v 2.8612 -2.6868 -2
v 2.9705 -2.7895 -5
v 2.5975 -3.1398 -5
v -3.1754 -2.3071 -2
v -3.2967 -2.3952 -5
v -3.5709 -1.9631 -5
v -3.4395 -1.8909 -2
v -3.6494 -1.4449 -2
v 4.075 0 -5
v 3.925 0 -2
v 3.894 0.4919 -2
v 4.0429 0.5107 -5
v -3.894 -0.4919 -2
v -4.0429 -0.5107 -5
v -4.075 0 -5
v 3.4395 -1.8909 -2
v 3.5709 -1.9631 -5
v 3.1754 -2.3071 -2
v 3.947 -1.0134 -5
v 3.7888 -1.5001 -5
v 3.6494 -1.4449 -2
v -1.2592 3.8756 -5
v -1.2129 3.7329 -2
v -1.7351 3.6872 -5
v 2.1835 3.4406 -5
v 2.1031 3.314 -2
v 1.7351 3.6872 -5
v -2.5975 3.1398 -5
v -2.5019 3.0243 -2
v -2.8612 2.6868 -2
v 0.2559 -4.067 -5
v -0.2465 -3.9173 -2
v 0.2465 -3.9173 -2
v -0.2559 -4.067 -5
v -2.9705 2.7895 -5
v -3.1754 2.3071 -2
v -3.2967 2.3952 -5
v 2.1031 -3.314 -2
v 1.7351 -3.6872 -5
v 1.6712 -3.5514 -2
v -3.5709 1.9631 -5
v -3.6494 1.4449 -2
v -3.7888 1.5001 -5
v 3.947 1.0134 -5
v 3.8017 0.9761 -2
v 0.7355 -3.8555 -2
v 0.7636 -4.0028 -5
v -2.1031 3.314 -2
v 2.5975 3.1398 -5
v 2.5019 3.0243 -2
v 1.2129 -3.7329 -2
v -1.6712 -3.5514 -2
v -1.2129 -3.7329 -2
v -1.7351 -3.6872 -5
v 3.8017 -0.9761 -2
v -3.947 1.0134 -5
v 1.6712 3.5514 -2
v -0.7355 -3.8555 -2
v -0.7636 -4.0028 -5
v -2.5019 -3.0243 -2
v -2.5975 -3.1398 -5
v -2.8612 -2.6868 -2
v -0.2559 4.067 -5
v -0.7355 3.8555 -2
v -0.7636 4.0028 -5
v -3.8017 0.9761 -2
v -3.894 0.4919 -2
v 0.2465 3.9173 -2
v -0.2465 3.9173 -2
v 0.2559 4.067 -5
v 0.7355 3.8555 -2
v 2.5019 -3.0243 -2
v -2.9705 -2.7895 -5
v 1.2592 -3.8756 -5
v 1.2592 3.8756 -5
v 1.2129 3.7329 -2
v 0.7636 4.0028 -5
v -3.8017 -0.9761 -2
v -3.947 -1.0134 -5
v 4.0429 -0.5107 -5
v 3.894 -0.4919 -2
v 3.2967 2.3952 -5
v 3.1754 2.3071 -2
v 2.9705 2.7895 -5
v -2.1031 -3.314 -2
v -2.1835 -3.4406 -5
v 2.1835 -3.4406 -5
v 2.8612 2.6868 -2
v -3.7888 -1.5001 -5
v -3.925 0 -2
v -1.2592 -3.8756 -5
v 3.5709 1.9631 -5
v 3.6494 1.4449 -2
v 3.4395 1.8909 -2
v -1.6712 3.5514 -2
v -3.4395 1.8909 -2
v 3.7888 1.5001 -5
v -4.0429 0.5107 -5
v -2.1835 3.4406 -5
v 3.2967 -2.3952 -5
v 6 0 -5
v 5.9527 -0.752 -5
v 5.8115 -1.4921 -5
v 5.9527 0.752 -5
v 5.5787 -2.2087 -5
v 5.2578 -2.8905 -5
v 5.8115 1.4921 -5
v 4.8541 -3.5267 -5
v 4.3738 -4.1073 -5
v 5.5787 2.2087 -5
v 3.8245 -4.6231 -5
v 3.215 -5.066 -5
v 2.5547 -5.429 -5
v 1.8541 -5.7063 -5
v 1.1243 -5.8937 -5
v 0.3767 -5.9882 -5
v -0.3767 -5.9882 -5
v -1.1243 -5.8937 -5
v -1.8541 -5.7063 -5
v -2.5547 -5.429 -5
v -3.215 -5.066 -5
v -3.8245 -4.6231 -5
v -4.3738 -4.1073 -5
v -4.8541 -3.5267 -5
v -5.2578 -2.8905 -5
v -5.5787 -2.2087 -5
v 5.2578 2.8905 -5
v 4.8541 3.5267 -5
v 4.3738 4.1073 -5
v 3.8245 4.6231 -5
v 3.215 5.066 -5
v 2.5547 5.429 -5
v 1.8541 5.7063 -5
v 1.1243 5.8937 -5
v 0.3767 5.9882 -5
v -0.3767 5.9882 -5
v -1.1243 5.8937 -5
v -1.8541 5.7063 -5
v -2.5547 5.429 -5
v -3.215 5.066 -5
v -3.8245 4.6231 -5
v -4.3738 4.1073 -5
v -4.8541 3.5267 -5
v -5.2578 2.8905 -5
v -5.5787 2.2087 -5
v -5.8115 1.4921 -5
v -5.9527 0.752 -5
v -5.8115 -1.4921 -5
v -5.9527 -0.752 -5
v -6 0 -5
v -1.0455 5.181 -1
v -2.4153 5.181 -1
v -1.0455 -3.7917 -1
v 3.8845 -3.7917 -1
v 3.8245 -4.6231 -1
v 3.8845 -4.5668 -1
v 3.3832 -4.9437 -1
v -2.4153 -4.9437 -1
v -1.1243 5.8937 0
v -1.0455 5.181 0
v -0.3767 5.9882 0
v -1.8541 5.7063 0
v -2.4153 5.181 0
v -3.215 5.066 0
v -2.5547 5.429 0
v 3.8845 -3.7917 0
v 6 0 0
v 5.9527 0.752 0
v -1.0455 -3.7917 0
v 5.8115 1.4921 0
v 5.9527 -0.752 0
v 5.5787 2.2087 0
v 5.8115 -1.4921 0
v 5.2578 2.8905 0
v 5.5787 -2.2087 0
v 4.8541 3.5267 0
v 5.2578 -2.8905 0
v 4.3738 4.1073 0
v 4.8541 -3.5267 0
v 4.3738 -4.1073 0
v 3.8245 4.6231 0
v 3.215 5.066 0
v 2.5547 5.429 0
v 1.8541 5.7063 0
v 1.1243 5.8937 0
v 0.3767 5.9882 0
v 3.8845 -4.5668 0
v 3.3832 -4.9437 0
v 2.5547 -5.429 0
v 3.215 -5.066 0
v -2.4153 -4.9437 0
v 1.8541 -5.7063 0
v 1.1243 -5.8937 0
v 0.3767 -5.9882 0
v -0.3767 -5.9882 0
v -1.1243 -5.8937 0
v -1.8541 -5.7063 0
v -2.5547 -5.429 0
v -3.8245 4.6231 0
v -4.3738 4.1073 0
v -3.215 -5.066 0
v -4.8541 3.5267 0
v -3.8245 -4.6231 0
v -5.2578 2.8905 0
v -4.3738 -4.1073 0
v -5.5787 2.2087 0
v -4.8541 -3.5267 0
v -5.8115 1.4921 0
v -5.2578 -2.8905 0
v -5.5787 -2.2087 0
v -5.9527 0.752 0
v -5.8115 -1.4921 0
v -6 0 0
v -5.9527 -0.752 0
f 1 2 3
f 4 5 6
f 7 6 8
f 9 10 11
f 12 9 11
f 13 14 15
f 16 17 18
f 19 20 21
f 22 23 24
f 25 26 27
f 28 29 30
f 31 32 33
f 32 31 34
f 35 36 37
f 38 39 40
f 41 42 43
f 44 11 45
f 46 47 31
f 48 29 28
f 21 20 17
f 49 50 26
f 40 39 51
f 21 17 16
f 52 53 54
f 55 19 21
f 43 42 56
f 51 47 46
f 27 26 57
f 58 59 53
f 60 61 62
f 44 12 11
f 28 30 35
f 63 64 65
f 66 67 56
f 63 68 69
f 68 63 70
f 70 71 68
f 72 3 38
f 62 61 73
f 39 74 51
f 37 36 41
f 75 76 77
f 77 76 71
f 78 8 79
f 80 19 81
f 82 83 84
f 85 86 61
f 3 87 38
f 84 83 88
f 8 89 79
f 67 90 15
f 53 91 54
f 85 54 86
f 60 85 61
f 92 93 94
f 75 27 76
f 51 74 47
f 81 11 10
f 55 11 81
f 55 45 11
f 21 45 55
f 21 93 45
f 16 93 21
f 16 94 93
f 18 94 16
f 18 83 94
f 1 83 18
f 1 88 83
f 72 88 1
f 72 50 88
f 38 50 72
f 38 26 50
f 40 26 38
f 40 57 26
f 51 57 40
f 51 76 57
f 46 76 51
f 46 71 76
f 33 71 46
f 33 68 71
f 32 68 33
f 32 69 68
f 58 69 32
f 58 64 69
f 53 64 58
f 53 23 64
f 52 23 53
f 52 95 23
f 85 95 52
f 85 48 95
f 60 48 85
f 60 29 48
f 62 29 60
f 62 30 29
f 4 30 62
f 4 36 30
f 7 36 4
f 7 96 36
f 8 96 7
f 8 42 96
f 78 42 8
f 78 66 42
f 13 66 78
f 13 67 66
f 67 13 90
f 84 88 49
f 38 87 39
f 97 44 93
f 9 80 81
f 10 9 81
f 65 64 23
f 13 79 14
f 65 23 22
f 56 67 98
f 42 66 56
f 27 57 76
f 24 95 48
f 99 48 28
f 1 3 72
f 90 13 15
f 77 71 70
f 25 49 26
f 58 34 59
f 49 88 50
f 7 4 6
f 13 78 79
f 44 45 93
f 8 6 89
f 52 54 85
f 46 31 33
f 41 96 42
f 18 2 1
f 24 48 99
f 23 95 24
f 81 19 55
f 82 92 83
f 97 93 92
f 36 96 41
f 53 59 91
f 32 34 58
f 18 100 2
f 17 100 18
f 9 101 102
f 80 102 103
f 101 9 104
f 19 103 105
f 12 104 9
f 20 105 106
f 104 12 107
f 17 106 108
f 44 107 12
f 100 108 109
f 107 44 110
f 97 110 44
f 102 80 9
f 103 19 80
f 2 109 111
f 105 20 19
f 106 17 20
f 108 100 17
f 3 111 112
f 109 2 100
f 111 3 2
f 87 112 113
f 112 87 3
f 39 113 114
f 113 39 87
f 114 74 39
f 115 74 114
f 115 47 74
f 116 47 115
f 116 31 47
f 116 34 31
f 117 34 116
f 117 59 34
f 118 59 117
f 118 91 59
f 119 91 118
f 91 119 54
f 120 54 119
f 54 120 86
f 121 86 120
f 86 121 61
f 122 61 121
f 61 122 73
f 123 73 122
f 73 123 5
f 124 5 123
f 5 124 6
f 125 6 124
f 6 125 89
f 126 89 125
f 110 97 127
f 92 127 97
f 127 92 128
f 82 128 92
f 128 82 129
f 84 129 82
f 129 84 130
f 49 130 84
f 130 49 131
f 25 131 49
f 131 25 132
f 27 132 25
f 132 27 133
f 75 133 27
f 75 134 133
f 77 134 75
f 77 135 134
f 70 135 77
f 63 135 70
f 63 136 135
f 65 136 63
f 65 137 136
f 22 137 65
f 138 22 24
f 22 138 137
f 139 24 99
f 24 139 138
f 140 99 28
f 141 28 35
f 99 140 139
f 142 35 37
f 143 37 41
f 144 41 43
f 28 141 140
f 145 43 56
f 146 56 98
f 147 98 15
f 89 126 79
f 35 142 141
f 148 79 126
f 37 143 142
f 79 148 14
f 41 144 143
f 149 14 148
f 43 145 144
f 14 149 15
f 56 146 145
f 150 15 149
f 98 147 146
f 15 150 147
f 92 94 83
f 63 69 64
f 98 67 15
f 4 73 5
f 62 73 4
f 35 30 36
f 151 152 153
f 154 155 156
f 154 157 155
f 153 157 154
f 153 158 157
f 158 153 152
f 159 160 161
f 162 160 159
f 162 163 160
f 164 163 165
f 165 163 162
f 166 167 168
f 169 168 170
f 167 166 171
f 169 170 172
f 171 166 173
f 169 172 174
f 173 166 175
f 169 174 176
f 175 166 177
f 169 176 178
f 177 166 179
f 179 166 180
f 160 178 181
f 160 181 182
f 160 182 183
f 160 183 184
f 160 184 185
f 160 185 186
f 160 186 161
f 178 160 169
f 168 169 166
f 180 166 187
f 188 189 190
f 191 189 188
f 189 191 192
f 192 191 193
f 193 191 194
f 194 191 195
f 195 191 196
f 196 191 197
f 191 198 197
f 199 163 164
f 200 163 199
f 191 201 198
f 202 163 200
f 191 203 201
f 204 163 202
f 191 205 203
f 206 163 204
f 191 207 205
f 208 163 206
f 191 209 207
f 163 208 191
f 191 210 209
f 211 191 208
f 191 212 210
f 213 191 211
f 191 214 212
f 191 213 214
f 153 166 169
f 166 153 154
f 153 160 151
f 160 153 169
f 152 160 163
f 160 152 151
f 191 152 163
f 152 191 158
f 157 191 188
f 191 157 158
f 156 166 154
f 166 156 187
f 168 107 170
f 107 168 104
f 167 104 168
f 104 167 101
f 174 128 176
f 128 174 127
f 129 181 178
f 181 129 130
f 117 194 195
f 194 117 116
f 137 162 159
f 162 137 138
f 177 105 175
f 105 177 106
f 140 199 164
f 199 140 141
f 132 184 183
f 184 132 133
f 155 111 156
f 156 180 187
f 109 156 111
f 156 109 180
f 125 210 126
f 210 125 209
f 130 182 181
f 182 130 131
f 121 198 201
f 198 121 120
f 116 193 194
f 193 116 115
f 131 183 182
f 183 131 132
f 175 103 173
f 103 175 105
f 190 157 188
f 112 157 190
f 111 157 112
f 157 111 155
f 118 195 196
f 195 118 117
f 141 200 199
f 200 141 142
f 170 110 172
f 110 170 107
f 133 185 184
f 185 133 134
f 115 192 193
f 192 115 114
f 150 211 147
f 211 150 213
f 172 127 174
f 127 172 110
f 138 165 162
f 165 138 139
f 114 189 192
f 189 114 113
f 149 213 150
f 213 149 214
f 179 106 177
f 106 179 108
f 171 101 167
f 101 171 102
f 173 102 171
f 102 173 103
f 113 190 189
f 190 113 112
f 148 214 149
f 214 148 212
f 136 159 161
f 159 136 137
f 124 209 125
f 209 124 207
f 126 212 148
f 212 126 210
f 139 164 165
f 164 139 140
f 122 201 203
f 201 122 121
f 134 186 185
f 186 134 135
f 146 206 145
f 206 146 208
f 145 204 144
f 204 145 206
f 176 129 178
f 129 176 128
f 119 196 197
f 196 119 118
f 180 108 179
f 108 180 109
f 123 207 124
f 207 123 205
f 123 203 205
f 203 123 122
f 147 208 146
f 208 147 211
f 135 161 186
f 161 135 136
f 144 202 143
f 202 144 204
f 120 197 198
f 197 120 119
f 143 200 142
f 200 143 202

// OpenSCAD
$fn = 50;

difference() {
	union() {
		translate(v = [0, 0, -5.0]) {
			cylinder(h = 5, r = 6.0);
		}
	}
	union() {
		#translate(v = [0, 0, -5.0]) {
			cylinder(h = 3, r1 = 4.075, r2 = 3.925);
		}
		translate(v = [0, 0, -1]) {
			linear_extrude(height = 1) {
				text(font = "Impact", halign = "center", size = 10, text = "L", valign = "center");
			}
		}
	}
}
